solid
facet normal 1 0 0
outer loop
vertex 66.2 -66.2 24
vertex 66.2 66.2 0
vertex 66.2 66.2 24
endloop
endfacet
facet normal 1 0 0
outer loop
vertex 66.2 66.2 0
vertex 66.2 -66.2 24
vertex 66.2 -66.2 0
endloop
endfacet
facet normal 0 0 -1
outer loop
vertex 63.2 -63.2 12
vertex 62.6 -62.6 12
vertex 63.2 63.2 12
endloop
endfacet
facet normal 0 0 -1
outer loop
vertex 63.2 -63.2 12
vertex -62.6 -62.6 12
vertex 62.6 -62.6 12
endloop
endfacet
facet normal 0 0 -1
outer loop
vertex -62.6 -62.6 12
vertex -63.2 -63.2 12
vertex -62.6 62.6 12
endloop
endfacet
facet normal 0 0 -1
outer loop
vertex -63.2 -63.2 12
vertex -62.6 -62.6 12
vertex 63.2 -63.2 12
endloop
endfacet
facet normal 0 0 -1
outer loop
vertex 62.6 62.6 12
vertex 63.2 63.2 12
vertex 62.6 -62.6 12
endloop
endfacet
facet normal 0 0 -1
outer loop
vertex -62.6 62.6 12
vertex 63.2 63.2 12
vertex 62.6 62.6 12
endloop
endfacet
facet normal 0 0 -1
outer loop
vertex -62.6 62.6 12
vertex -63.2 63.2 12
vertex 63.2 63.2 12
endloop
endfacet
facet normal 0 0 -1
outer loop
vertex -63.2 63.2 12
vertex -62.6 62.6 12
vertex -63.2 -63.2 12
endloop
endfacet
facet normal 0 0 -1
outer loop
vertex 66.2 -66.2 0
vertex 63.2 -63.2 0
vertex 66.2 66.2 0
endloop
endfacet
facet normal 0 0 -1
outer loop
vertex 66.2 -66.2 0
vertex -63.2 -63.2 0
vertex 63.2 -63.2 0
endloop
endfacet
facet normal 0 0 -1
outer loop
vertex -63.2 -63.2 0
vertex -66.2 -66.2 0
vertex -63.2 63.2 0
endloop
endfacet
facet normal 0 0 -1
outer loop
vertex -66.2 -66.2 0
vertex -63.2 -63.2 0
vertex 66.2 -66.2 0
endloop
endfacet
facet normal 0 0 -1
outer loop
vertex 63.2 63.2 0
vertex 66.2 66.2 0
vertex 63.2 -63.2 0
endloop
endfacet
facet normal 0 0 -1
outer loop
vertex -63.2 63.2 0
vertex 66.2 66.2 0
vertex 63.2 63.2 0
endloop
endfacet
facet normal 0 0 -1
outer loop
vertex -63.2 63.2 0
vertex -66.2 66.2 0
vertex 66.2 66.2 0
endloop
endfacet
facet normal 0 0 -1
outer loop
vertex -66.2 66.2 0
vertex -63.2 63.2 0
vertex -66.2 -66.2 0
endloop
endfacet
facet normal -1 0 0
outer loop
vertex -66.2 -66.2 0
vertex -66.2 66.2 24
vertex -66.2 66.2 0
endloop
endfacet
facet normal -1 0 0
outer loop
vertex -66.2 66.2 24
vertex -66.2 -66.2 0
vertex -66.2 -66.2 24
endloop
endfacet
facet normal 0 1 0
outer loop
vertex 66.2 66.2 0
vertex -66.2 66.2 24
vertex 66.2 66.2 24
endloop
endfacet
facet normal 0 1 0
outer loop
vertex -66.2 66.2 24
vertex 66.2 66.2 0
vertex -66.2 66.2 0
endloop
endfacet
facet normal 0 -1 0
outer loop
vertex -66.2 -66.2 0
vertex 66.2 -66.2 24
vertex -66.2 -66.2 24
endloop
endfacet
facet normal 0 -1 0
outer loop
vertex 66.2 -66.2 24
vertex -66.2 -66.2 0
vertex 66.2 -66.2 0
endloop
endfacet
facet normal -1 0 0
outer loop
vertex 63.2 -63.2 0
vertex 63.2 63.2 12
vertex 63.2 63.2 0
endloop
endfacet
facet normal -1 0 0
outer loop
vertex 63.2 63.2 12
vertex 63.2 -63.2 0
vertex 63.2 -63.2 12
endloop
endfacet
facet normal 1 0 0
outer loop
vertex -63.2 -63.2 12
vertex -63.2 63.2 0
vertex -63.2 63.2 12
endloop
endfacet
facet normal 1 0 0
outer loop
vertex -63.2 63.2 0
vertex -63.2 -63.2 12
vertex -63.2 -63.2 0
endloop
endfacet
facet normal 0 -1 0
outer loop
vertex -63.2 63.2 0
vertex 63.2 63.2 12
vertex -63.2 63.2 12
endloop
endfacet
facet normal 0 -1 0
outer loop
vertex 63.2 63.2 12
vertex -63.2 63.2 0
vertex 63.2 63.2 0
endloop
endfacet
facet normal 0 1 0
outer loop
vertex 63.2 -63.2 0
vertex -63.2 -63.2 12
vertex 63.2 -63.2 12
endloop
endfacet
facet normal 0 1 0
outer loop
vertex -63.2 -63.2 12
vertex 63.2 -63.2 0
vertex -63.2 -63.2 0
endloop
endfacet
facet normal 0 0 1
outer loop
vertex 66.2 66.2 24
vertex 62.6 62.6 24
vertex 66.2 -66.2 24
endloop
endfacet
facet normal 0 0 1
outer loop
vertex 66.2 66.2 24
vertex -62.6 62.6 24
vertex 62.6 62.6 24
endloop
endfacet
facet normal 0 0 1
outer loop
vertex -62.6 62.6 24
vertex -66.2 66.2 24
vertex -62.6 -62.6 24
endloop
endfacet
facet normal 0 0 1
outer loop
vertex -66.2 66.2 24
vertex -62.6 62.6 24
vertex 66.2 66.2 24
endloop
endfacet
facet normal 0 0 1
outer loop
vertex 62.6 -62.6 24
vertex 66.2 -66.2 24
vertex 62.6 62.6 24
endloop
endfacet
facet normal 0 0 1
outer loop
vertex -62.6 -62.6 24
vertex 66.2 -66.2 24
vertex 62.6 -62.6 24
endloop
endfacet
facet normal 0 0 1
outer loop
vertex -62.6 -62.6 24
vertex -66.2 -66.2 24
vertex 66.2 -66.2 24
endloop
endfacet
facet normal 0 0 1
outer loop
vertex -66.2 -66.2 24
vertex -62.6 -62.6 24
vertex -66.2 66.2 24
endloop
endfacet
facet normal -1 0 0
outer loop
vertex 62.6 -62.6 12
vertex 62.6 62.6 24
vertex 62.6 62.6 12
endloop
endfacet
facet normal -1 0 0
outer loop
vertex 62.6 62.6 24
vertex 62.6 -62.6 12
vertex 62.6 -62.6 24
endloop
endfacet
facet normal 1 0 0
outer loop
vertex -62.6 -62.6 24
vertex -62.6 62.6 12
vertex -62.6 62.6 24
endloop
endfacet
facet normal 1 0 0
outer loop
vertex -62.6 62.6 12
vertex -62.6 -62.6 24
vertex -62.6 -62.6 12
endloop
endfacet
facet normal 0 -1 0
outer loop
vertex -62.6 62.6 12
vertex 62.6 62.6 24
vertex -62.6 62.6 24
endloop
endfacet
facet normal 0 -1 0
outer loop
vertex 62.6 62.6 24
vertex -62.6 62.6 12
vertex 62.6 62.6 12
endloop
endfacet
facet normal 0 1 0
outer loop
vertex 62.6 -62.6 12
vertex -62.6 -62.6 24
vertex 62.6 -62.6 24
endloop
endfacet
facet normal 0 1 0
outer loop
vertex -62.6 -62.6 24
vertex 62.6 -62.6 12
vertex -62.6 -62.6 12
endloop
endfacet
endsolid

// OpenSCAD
// V7 MDF. X=fluxo, Y=largura, Z=altura. Milímetros.
// Modelos de fabricação deitados: abertura na direção Z.
parede=3; apoio=6; folga=0.4; E=120+2*parede;
centro=122.4; piso=62.4-parede; externo=E+folga+6;
$fn=64; macho_final=126.2;
module anel(L,fora,dentro) { difference() {
 translate([-fora/2,-fora/2,0]) cube([fora,fora,L]);
 translate([-dentro/2,-dentro/2,-.01]) cube([dentro,dentro,L+.02]);
} }
module uniao_entrada() { // Z=0..12 MDF; Z=12..24 câmara V5
 union() {anel(12,externo,E+folga); translate([0,0,12]) anel(12,externo,124.8+folga);}
}
module uniao_saida() { // Z=0..12 câmara V5; Z=12..24 MDF
 union() {anel(12,externo,124.8+folga); translate([0,0,12]) anel(12,externo,E+folga);}
}
module ligacao(macho=126.2) {
 union() { anel(12,externo,E+folga); translate([0,0,12]) anel(3,131,120);
 translate([0,0,15]) difference() {anel(12,macho,120);
 // Chanfro nominal de 0,4 na borda externa e interna do macho.
 translate([0,0,11.6]) difference() {
 translate([-70,-70,0]) cube([140,140,.41]);
 hull() {translate([-macho/2,-macho/2,0]) cube([macho,macho,.001]);
 translate([-macho/2+.4,-macho/2+.4,.4]) cube([macho-.8,macho-.8,.001]);}
 }
 translate([0,0,11.6]) hull() {translate([-60,-60,0]) cube([120,120,.001]);
 translate([-60.4,-60.4,.4]) cube([120.8,120.8,.001]);}
 } }
}
module cupom_mdf() { anel(12,externo,E+folga); }

peca="entrada";
if(peca=="entrada") uniao_entrada();
if(peca=="saida") uniao_saida();
if(peca=="ligacao") ligacao(macho_final);
if(peca=="cupom") cupom_mdf();
